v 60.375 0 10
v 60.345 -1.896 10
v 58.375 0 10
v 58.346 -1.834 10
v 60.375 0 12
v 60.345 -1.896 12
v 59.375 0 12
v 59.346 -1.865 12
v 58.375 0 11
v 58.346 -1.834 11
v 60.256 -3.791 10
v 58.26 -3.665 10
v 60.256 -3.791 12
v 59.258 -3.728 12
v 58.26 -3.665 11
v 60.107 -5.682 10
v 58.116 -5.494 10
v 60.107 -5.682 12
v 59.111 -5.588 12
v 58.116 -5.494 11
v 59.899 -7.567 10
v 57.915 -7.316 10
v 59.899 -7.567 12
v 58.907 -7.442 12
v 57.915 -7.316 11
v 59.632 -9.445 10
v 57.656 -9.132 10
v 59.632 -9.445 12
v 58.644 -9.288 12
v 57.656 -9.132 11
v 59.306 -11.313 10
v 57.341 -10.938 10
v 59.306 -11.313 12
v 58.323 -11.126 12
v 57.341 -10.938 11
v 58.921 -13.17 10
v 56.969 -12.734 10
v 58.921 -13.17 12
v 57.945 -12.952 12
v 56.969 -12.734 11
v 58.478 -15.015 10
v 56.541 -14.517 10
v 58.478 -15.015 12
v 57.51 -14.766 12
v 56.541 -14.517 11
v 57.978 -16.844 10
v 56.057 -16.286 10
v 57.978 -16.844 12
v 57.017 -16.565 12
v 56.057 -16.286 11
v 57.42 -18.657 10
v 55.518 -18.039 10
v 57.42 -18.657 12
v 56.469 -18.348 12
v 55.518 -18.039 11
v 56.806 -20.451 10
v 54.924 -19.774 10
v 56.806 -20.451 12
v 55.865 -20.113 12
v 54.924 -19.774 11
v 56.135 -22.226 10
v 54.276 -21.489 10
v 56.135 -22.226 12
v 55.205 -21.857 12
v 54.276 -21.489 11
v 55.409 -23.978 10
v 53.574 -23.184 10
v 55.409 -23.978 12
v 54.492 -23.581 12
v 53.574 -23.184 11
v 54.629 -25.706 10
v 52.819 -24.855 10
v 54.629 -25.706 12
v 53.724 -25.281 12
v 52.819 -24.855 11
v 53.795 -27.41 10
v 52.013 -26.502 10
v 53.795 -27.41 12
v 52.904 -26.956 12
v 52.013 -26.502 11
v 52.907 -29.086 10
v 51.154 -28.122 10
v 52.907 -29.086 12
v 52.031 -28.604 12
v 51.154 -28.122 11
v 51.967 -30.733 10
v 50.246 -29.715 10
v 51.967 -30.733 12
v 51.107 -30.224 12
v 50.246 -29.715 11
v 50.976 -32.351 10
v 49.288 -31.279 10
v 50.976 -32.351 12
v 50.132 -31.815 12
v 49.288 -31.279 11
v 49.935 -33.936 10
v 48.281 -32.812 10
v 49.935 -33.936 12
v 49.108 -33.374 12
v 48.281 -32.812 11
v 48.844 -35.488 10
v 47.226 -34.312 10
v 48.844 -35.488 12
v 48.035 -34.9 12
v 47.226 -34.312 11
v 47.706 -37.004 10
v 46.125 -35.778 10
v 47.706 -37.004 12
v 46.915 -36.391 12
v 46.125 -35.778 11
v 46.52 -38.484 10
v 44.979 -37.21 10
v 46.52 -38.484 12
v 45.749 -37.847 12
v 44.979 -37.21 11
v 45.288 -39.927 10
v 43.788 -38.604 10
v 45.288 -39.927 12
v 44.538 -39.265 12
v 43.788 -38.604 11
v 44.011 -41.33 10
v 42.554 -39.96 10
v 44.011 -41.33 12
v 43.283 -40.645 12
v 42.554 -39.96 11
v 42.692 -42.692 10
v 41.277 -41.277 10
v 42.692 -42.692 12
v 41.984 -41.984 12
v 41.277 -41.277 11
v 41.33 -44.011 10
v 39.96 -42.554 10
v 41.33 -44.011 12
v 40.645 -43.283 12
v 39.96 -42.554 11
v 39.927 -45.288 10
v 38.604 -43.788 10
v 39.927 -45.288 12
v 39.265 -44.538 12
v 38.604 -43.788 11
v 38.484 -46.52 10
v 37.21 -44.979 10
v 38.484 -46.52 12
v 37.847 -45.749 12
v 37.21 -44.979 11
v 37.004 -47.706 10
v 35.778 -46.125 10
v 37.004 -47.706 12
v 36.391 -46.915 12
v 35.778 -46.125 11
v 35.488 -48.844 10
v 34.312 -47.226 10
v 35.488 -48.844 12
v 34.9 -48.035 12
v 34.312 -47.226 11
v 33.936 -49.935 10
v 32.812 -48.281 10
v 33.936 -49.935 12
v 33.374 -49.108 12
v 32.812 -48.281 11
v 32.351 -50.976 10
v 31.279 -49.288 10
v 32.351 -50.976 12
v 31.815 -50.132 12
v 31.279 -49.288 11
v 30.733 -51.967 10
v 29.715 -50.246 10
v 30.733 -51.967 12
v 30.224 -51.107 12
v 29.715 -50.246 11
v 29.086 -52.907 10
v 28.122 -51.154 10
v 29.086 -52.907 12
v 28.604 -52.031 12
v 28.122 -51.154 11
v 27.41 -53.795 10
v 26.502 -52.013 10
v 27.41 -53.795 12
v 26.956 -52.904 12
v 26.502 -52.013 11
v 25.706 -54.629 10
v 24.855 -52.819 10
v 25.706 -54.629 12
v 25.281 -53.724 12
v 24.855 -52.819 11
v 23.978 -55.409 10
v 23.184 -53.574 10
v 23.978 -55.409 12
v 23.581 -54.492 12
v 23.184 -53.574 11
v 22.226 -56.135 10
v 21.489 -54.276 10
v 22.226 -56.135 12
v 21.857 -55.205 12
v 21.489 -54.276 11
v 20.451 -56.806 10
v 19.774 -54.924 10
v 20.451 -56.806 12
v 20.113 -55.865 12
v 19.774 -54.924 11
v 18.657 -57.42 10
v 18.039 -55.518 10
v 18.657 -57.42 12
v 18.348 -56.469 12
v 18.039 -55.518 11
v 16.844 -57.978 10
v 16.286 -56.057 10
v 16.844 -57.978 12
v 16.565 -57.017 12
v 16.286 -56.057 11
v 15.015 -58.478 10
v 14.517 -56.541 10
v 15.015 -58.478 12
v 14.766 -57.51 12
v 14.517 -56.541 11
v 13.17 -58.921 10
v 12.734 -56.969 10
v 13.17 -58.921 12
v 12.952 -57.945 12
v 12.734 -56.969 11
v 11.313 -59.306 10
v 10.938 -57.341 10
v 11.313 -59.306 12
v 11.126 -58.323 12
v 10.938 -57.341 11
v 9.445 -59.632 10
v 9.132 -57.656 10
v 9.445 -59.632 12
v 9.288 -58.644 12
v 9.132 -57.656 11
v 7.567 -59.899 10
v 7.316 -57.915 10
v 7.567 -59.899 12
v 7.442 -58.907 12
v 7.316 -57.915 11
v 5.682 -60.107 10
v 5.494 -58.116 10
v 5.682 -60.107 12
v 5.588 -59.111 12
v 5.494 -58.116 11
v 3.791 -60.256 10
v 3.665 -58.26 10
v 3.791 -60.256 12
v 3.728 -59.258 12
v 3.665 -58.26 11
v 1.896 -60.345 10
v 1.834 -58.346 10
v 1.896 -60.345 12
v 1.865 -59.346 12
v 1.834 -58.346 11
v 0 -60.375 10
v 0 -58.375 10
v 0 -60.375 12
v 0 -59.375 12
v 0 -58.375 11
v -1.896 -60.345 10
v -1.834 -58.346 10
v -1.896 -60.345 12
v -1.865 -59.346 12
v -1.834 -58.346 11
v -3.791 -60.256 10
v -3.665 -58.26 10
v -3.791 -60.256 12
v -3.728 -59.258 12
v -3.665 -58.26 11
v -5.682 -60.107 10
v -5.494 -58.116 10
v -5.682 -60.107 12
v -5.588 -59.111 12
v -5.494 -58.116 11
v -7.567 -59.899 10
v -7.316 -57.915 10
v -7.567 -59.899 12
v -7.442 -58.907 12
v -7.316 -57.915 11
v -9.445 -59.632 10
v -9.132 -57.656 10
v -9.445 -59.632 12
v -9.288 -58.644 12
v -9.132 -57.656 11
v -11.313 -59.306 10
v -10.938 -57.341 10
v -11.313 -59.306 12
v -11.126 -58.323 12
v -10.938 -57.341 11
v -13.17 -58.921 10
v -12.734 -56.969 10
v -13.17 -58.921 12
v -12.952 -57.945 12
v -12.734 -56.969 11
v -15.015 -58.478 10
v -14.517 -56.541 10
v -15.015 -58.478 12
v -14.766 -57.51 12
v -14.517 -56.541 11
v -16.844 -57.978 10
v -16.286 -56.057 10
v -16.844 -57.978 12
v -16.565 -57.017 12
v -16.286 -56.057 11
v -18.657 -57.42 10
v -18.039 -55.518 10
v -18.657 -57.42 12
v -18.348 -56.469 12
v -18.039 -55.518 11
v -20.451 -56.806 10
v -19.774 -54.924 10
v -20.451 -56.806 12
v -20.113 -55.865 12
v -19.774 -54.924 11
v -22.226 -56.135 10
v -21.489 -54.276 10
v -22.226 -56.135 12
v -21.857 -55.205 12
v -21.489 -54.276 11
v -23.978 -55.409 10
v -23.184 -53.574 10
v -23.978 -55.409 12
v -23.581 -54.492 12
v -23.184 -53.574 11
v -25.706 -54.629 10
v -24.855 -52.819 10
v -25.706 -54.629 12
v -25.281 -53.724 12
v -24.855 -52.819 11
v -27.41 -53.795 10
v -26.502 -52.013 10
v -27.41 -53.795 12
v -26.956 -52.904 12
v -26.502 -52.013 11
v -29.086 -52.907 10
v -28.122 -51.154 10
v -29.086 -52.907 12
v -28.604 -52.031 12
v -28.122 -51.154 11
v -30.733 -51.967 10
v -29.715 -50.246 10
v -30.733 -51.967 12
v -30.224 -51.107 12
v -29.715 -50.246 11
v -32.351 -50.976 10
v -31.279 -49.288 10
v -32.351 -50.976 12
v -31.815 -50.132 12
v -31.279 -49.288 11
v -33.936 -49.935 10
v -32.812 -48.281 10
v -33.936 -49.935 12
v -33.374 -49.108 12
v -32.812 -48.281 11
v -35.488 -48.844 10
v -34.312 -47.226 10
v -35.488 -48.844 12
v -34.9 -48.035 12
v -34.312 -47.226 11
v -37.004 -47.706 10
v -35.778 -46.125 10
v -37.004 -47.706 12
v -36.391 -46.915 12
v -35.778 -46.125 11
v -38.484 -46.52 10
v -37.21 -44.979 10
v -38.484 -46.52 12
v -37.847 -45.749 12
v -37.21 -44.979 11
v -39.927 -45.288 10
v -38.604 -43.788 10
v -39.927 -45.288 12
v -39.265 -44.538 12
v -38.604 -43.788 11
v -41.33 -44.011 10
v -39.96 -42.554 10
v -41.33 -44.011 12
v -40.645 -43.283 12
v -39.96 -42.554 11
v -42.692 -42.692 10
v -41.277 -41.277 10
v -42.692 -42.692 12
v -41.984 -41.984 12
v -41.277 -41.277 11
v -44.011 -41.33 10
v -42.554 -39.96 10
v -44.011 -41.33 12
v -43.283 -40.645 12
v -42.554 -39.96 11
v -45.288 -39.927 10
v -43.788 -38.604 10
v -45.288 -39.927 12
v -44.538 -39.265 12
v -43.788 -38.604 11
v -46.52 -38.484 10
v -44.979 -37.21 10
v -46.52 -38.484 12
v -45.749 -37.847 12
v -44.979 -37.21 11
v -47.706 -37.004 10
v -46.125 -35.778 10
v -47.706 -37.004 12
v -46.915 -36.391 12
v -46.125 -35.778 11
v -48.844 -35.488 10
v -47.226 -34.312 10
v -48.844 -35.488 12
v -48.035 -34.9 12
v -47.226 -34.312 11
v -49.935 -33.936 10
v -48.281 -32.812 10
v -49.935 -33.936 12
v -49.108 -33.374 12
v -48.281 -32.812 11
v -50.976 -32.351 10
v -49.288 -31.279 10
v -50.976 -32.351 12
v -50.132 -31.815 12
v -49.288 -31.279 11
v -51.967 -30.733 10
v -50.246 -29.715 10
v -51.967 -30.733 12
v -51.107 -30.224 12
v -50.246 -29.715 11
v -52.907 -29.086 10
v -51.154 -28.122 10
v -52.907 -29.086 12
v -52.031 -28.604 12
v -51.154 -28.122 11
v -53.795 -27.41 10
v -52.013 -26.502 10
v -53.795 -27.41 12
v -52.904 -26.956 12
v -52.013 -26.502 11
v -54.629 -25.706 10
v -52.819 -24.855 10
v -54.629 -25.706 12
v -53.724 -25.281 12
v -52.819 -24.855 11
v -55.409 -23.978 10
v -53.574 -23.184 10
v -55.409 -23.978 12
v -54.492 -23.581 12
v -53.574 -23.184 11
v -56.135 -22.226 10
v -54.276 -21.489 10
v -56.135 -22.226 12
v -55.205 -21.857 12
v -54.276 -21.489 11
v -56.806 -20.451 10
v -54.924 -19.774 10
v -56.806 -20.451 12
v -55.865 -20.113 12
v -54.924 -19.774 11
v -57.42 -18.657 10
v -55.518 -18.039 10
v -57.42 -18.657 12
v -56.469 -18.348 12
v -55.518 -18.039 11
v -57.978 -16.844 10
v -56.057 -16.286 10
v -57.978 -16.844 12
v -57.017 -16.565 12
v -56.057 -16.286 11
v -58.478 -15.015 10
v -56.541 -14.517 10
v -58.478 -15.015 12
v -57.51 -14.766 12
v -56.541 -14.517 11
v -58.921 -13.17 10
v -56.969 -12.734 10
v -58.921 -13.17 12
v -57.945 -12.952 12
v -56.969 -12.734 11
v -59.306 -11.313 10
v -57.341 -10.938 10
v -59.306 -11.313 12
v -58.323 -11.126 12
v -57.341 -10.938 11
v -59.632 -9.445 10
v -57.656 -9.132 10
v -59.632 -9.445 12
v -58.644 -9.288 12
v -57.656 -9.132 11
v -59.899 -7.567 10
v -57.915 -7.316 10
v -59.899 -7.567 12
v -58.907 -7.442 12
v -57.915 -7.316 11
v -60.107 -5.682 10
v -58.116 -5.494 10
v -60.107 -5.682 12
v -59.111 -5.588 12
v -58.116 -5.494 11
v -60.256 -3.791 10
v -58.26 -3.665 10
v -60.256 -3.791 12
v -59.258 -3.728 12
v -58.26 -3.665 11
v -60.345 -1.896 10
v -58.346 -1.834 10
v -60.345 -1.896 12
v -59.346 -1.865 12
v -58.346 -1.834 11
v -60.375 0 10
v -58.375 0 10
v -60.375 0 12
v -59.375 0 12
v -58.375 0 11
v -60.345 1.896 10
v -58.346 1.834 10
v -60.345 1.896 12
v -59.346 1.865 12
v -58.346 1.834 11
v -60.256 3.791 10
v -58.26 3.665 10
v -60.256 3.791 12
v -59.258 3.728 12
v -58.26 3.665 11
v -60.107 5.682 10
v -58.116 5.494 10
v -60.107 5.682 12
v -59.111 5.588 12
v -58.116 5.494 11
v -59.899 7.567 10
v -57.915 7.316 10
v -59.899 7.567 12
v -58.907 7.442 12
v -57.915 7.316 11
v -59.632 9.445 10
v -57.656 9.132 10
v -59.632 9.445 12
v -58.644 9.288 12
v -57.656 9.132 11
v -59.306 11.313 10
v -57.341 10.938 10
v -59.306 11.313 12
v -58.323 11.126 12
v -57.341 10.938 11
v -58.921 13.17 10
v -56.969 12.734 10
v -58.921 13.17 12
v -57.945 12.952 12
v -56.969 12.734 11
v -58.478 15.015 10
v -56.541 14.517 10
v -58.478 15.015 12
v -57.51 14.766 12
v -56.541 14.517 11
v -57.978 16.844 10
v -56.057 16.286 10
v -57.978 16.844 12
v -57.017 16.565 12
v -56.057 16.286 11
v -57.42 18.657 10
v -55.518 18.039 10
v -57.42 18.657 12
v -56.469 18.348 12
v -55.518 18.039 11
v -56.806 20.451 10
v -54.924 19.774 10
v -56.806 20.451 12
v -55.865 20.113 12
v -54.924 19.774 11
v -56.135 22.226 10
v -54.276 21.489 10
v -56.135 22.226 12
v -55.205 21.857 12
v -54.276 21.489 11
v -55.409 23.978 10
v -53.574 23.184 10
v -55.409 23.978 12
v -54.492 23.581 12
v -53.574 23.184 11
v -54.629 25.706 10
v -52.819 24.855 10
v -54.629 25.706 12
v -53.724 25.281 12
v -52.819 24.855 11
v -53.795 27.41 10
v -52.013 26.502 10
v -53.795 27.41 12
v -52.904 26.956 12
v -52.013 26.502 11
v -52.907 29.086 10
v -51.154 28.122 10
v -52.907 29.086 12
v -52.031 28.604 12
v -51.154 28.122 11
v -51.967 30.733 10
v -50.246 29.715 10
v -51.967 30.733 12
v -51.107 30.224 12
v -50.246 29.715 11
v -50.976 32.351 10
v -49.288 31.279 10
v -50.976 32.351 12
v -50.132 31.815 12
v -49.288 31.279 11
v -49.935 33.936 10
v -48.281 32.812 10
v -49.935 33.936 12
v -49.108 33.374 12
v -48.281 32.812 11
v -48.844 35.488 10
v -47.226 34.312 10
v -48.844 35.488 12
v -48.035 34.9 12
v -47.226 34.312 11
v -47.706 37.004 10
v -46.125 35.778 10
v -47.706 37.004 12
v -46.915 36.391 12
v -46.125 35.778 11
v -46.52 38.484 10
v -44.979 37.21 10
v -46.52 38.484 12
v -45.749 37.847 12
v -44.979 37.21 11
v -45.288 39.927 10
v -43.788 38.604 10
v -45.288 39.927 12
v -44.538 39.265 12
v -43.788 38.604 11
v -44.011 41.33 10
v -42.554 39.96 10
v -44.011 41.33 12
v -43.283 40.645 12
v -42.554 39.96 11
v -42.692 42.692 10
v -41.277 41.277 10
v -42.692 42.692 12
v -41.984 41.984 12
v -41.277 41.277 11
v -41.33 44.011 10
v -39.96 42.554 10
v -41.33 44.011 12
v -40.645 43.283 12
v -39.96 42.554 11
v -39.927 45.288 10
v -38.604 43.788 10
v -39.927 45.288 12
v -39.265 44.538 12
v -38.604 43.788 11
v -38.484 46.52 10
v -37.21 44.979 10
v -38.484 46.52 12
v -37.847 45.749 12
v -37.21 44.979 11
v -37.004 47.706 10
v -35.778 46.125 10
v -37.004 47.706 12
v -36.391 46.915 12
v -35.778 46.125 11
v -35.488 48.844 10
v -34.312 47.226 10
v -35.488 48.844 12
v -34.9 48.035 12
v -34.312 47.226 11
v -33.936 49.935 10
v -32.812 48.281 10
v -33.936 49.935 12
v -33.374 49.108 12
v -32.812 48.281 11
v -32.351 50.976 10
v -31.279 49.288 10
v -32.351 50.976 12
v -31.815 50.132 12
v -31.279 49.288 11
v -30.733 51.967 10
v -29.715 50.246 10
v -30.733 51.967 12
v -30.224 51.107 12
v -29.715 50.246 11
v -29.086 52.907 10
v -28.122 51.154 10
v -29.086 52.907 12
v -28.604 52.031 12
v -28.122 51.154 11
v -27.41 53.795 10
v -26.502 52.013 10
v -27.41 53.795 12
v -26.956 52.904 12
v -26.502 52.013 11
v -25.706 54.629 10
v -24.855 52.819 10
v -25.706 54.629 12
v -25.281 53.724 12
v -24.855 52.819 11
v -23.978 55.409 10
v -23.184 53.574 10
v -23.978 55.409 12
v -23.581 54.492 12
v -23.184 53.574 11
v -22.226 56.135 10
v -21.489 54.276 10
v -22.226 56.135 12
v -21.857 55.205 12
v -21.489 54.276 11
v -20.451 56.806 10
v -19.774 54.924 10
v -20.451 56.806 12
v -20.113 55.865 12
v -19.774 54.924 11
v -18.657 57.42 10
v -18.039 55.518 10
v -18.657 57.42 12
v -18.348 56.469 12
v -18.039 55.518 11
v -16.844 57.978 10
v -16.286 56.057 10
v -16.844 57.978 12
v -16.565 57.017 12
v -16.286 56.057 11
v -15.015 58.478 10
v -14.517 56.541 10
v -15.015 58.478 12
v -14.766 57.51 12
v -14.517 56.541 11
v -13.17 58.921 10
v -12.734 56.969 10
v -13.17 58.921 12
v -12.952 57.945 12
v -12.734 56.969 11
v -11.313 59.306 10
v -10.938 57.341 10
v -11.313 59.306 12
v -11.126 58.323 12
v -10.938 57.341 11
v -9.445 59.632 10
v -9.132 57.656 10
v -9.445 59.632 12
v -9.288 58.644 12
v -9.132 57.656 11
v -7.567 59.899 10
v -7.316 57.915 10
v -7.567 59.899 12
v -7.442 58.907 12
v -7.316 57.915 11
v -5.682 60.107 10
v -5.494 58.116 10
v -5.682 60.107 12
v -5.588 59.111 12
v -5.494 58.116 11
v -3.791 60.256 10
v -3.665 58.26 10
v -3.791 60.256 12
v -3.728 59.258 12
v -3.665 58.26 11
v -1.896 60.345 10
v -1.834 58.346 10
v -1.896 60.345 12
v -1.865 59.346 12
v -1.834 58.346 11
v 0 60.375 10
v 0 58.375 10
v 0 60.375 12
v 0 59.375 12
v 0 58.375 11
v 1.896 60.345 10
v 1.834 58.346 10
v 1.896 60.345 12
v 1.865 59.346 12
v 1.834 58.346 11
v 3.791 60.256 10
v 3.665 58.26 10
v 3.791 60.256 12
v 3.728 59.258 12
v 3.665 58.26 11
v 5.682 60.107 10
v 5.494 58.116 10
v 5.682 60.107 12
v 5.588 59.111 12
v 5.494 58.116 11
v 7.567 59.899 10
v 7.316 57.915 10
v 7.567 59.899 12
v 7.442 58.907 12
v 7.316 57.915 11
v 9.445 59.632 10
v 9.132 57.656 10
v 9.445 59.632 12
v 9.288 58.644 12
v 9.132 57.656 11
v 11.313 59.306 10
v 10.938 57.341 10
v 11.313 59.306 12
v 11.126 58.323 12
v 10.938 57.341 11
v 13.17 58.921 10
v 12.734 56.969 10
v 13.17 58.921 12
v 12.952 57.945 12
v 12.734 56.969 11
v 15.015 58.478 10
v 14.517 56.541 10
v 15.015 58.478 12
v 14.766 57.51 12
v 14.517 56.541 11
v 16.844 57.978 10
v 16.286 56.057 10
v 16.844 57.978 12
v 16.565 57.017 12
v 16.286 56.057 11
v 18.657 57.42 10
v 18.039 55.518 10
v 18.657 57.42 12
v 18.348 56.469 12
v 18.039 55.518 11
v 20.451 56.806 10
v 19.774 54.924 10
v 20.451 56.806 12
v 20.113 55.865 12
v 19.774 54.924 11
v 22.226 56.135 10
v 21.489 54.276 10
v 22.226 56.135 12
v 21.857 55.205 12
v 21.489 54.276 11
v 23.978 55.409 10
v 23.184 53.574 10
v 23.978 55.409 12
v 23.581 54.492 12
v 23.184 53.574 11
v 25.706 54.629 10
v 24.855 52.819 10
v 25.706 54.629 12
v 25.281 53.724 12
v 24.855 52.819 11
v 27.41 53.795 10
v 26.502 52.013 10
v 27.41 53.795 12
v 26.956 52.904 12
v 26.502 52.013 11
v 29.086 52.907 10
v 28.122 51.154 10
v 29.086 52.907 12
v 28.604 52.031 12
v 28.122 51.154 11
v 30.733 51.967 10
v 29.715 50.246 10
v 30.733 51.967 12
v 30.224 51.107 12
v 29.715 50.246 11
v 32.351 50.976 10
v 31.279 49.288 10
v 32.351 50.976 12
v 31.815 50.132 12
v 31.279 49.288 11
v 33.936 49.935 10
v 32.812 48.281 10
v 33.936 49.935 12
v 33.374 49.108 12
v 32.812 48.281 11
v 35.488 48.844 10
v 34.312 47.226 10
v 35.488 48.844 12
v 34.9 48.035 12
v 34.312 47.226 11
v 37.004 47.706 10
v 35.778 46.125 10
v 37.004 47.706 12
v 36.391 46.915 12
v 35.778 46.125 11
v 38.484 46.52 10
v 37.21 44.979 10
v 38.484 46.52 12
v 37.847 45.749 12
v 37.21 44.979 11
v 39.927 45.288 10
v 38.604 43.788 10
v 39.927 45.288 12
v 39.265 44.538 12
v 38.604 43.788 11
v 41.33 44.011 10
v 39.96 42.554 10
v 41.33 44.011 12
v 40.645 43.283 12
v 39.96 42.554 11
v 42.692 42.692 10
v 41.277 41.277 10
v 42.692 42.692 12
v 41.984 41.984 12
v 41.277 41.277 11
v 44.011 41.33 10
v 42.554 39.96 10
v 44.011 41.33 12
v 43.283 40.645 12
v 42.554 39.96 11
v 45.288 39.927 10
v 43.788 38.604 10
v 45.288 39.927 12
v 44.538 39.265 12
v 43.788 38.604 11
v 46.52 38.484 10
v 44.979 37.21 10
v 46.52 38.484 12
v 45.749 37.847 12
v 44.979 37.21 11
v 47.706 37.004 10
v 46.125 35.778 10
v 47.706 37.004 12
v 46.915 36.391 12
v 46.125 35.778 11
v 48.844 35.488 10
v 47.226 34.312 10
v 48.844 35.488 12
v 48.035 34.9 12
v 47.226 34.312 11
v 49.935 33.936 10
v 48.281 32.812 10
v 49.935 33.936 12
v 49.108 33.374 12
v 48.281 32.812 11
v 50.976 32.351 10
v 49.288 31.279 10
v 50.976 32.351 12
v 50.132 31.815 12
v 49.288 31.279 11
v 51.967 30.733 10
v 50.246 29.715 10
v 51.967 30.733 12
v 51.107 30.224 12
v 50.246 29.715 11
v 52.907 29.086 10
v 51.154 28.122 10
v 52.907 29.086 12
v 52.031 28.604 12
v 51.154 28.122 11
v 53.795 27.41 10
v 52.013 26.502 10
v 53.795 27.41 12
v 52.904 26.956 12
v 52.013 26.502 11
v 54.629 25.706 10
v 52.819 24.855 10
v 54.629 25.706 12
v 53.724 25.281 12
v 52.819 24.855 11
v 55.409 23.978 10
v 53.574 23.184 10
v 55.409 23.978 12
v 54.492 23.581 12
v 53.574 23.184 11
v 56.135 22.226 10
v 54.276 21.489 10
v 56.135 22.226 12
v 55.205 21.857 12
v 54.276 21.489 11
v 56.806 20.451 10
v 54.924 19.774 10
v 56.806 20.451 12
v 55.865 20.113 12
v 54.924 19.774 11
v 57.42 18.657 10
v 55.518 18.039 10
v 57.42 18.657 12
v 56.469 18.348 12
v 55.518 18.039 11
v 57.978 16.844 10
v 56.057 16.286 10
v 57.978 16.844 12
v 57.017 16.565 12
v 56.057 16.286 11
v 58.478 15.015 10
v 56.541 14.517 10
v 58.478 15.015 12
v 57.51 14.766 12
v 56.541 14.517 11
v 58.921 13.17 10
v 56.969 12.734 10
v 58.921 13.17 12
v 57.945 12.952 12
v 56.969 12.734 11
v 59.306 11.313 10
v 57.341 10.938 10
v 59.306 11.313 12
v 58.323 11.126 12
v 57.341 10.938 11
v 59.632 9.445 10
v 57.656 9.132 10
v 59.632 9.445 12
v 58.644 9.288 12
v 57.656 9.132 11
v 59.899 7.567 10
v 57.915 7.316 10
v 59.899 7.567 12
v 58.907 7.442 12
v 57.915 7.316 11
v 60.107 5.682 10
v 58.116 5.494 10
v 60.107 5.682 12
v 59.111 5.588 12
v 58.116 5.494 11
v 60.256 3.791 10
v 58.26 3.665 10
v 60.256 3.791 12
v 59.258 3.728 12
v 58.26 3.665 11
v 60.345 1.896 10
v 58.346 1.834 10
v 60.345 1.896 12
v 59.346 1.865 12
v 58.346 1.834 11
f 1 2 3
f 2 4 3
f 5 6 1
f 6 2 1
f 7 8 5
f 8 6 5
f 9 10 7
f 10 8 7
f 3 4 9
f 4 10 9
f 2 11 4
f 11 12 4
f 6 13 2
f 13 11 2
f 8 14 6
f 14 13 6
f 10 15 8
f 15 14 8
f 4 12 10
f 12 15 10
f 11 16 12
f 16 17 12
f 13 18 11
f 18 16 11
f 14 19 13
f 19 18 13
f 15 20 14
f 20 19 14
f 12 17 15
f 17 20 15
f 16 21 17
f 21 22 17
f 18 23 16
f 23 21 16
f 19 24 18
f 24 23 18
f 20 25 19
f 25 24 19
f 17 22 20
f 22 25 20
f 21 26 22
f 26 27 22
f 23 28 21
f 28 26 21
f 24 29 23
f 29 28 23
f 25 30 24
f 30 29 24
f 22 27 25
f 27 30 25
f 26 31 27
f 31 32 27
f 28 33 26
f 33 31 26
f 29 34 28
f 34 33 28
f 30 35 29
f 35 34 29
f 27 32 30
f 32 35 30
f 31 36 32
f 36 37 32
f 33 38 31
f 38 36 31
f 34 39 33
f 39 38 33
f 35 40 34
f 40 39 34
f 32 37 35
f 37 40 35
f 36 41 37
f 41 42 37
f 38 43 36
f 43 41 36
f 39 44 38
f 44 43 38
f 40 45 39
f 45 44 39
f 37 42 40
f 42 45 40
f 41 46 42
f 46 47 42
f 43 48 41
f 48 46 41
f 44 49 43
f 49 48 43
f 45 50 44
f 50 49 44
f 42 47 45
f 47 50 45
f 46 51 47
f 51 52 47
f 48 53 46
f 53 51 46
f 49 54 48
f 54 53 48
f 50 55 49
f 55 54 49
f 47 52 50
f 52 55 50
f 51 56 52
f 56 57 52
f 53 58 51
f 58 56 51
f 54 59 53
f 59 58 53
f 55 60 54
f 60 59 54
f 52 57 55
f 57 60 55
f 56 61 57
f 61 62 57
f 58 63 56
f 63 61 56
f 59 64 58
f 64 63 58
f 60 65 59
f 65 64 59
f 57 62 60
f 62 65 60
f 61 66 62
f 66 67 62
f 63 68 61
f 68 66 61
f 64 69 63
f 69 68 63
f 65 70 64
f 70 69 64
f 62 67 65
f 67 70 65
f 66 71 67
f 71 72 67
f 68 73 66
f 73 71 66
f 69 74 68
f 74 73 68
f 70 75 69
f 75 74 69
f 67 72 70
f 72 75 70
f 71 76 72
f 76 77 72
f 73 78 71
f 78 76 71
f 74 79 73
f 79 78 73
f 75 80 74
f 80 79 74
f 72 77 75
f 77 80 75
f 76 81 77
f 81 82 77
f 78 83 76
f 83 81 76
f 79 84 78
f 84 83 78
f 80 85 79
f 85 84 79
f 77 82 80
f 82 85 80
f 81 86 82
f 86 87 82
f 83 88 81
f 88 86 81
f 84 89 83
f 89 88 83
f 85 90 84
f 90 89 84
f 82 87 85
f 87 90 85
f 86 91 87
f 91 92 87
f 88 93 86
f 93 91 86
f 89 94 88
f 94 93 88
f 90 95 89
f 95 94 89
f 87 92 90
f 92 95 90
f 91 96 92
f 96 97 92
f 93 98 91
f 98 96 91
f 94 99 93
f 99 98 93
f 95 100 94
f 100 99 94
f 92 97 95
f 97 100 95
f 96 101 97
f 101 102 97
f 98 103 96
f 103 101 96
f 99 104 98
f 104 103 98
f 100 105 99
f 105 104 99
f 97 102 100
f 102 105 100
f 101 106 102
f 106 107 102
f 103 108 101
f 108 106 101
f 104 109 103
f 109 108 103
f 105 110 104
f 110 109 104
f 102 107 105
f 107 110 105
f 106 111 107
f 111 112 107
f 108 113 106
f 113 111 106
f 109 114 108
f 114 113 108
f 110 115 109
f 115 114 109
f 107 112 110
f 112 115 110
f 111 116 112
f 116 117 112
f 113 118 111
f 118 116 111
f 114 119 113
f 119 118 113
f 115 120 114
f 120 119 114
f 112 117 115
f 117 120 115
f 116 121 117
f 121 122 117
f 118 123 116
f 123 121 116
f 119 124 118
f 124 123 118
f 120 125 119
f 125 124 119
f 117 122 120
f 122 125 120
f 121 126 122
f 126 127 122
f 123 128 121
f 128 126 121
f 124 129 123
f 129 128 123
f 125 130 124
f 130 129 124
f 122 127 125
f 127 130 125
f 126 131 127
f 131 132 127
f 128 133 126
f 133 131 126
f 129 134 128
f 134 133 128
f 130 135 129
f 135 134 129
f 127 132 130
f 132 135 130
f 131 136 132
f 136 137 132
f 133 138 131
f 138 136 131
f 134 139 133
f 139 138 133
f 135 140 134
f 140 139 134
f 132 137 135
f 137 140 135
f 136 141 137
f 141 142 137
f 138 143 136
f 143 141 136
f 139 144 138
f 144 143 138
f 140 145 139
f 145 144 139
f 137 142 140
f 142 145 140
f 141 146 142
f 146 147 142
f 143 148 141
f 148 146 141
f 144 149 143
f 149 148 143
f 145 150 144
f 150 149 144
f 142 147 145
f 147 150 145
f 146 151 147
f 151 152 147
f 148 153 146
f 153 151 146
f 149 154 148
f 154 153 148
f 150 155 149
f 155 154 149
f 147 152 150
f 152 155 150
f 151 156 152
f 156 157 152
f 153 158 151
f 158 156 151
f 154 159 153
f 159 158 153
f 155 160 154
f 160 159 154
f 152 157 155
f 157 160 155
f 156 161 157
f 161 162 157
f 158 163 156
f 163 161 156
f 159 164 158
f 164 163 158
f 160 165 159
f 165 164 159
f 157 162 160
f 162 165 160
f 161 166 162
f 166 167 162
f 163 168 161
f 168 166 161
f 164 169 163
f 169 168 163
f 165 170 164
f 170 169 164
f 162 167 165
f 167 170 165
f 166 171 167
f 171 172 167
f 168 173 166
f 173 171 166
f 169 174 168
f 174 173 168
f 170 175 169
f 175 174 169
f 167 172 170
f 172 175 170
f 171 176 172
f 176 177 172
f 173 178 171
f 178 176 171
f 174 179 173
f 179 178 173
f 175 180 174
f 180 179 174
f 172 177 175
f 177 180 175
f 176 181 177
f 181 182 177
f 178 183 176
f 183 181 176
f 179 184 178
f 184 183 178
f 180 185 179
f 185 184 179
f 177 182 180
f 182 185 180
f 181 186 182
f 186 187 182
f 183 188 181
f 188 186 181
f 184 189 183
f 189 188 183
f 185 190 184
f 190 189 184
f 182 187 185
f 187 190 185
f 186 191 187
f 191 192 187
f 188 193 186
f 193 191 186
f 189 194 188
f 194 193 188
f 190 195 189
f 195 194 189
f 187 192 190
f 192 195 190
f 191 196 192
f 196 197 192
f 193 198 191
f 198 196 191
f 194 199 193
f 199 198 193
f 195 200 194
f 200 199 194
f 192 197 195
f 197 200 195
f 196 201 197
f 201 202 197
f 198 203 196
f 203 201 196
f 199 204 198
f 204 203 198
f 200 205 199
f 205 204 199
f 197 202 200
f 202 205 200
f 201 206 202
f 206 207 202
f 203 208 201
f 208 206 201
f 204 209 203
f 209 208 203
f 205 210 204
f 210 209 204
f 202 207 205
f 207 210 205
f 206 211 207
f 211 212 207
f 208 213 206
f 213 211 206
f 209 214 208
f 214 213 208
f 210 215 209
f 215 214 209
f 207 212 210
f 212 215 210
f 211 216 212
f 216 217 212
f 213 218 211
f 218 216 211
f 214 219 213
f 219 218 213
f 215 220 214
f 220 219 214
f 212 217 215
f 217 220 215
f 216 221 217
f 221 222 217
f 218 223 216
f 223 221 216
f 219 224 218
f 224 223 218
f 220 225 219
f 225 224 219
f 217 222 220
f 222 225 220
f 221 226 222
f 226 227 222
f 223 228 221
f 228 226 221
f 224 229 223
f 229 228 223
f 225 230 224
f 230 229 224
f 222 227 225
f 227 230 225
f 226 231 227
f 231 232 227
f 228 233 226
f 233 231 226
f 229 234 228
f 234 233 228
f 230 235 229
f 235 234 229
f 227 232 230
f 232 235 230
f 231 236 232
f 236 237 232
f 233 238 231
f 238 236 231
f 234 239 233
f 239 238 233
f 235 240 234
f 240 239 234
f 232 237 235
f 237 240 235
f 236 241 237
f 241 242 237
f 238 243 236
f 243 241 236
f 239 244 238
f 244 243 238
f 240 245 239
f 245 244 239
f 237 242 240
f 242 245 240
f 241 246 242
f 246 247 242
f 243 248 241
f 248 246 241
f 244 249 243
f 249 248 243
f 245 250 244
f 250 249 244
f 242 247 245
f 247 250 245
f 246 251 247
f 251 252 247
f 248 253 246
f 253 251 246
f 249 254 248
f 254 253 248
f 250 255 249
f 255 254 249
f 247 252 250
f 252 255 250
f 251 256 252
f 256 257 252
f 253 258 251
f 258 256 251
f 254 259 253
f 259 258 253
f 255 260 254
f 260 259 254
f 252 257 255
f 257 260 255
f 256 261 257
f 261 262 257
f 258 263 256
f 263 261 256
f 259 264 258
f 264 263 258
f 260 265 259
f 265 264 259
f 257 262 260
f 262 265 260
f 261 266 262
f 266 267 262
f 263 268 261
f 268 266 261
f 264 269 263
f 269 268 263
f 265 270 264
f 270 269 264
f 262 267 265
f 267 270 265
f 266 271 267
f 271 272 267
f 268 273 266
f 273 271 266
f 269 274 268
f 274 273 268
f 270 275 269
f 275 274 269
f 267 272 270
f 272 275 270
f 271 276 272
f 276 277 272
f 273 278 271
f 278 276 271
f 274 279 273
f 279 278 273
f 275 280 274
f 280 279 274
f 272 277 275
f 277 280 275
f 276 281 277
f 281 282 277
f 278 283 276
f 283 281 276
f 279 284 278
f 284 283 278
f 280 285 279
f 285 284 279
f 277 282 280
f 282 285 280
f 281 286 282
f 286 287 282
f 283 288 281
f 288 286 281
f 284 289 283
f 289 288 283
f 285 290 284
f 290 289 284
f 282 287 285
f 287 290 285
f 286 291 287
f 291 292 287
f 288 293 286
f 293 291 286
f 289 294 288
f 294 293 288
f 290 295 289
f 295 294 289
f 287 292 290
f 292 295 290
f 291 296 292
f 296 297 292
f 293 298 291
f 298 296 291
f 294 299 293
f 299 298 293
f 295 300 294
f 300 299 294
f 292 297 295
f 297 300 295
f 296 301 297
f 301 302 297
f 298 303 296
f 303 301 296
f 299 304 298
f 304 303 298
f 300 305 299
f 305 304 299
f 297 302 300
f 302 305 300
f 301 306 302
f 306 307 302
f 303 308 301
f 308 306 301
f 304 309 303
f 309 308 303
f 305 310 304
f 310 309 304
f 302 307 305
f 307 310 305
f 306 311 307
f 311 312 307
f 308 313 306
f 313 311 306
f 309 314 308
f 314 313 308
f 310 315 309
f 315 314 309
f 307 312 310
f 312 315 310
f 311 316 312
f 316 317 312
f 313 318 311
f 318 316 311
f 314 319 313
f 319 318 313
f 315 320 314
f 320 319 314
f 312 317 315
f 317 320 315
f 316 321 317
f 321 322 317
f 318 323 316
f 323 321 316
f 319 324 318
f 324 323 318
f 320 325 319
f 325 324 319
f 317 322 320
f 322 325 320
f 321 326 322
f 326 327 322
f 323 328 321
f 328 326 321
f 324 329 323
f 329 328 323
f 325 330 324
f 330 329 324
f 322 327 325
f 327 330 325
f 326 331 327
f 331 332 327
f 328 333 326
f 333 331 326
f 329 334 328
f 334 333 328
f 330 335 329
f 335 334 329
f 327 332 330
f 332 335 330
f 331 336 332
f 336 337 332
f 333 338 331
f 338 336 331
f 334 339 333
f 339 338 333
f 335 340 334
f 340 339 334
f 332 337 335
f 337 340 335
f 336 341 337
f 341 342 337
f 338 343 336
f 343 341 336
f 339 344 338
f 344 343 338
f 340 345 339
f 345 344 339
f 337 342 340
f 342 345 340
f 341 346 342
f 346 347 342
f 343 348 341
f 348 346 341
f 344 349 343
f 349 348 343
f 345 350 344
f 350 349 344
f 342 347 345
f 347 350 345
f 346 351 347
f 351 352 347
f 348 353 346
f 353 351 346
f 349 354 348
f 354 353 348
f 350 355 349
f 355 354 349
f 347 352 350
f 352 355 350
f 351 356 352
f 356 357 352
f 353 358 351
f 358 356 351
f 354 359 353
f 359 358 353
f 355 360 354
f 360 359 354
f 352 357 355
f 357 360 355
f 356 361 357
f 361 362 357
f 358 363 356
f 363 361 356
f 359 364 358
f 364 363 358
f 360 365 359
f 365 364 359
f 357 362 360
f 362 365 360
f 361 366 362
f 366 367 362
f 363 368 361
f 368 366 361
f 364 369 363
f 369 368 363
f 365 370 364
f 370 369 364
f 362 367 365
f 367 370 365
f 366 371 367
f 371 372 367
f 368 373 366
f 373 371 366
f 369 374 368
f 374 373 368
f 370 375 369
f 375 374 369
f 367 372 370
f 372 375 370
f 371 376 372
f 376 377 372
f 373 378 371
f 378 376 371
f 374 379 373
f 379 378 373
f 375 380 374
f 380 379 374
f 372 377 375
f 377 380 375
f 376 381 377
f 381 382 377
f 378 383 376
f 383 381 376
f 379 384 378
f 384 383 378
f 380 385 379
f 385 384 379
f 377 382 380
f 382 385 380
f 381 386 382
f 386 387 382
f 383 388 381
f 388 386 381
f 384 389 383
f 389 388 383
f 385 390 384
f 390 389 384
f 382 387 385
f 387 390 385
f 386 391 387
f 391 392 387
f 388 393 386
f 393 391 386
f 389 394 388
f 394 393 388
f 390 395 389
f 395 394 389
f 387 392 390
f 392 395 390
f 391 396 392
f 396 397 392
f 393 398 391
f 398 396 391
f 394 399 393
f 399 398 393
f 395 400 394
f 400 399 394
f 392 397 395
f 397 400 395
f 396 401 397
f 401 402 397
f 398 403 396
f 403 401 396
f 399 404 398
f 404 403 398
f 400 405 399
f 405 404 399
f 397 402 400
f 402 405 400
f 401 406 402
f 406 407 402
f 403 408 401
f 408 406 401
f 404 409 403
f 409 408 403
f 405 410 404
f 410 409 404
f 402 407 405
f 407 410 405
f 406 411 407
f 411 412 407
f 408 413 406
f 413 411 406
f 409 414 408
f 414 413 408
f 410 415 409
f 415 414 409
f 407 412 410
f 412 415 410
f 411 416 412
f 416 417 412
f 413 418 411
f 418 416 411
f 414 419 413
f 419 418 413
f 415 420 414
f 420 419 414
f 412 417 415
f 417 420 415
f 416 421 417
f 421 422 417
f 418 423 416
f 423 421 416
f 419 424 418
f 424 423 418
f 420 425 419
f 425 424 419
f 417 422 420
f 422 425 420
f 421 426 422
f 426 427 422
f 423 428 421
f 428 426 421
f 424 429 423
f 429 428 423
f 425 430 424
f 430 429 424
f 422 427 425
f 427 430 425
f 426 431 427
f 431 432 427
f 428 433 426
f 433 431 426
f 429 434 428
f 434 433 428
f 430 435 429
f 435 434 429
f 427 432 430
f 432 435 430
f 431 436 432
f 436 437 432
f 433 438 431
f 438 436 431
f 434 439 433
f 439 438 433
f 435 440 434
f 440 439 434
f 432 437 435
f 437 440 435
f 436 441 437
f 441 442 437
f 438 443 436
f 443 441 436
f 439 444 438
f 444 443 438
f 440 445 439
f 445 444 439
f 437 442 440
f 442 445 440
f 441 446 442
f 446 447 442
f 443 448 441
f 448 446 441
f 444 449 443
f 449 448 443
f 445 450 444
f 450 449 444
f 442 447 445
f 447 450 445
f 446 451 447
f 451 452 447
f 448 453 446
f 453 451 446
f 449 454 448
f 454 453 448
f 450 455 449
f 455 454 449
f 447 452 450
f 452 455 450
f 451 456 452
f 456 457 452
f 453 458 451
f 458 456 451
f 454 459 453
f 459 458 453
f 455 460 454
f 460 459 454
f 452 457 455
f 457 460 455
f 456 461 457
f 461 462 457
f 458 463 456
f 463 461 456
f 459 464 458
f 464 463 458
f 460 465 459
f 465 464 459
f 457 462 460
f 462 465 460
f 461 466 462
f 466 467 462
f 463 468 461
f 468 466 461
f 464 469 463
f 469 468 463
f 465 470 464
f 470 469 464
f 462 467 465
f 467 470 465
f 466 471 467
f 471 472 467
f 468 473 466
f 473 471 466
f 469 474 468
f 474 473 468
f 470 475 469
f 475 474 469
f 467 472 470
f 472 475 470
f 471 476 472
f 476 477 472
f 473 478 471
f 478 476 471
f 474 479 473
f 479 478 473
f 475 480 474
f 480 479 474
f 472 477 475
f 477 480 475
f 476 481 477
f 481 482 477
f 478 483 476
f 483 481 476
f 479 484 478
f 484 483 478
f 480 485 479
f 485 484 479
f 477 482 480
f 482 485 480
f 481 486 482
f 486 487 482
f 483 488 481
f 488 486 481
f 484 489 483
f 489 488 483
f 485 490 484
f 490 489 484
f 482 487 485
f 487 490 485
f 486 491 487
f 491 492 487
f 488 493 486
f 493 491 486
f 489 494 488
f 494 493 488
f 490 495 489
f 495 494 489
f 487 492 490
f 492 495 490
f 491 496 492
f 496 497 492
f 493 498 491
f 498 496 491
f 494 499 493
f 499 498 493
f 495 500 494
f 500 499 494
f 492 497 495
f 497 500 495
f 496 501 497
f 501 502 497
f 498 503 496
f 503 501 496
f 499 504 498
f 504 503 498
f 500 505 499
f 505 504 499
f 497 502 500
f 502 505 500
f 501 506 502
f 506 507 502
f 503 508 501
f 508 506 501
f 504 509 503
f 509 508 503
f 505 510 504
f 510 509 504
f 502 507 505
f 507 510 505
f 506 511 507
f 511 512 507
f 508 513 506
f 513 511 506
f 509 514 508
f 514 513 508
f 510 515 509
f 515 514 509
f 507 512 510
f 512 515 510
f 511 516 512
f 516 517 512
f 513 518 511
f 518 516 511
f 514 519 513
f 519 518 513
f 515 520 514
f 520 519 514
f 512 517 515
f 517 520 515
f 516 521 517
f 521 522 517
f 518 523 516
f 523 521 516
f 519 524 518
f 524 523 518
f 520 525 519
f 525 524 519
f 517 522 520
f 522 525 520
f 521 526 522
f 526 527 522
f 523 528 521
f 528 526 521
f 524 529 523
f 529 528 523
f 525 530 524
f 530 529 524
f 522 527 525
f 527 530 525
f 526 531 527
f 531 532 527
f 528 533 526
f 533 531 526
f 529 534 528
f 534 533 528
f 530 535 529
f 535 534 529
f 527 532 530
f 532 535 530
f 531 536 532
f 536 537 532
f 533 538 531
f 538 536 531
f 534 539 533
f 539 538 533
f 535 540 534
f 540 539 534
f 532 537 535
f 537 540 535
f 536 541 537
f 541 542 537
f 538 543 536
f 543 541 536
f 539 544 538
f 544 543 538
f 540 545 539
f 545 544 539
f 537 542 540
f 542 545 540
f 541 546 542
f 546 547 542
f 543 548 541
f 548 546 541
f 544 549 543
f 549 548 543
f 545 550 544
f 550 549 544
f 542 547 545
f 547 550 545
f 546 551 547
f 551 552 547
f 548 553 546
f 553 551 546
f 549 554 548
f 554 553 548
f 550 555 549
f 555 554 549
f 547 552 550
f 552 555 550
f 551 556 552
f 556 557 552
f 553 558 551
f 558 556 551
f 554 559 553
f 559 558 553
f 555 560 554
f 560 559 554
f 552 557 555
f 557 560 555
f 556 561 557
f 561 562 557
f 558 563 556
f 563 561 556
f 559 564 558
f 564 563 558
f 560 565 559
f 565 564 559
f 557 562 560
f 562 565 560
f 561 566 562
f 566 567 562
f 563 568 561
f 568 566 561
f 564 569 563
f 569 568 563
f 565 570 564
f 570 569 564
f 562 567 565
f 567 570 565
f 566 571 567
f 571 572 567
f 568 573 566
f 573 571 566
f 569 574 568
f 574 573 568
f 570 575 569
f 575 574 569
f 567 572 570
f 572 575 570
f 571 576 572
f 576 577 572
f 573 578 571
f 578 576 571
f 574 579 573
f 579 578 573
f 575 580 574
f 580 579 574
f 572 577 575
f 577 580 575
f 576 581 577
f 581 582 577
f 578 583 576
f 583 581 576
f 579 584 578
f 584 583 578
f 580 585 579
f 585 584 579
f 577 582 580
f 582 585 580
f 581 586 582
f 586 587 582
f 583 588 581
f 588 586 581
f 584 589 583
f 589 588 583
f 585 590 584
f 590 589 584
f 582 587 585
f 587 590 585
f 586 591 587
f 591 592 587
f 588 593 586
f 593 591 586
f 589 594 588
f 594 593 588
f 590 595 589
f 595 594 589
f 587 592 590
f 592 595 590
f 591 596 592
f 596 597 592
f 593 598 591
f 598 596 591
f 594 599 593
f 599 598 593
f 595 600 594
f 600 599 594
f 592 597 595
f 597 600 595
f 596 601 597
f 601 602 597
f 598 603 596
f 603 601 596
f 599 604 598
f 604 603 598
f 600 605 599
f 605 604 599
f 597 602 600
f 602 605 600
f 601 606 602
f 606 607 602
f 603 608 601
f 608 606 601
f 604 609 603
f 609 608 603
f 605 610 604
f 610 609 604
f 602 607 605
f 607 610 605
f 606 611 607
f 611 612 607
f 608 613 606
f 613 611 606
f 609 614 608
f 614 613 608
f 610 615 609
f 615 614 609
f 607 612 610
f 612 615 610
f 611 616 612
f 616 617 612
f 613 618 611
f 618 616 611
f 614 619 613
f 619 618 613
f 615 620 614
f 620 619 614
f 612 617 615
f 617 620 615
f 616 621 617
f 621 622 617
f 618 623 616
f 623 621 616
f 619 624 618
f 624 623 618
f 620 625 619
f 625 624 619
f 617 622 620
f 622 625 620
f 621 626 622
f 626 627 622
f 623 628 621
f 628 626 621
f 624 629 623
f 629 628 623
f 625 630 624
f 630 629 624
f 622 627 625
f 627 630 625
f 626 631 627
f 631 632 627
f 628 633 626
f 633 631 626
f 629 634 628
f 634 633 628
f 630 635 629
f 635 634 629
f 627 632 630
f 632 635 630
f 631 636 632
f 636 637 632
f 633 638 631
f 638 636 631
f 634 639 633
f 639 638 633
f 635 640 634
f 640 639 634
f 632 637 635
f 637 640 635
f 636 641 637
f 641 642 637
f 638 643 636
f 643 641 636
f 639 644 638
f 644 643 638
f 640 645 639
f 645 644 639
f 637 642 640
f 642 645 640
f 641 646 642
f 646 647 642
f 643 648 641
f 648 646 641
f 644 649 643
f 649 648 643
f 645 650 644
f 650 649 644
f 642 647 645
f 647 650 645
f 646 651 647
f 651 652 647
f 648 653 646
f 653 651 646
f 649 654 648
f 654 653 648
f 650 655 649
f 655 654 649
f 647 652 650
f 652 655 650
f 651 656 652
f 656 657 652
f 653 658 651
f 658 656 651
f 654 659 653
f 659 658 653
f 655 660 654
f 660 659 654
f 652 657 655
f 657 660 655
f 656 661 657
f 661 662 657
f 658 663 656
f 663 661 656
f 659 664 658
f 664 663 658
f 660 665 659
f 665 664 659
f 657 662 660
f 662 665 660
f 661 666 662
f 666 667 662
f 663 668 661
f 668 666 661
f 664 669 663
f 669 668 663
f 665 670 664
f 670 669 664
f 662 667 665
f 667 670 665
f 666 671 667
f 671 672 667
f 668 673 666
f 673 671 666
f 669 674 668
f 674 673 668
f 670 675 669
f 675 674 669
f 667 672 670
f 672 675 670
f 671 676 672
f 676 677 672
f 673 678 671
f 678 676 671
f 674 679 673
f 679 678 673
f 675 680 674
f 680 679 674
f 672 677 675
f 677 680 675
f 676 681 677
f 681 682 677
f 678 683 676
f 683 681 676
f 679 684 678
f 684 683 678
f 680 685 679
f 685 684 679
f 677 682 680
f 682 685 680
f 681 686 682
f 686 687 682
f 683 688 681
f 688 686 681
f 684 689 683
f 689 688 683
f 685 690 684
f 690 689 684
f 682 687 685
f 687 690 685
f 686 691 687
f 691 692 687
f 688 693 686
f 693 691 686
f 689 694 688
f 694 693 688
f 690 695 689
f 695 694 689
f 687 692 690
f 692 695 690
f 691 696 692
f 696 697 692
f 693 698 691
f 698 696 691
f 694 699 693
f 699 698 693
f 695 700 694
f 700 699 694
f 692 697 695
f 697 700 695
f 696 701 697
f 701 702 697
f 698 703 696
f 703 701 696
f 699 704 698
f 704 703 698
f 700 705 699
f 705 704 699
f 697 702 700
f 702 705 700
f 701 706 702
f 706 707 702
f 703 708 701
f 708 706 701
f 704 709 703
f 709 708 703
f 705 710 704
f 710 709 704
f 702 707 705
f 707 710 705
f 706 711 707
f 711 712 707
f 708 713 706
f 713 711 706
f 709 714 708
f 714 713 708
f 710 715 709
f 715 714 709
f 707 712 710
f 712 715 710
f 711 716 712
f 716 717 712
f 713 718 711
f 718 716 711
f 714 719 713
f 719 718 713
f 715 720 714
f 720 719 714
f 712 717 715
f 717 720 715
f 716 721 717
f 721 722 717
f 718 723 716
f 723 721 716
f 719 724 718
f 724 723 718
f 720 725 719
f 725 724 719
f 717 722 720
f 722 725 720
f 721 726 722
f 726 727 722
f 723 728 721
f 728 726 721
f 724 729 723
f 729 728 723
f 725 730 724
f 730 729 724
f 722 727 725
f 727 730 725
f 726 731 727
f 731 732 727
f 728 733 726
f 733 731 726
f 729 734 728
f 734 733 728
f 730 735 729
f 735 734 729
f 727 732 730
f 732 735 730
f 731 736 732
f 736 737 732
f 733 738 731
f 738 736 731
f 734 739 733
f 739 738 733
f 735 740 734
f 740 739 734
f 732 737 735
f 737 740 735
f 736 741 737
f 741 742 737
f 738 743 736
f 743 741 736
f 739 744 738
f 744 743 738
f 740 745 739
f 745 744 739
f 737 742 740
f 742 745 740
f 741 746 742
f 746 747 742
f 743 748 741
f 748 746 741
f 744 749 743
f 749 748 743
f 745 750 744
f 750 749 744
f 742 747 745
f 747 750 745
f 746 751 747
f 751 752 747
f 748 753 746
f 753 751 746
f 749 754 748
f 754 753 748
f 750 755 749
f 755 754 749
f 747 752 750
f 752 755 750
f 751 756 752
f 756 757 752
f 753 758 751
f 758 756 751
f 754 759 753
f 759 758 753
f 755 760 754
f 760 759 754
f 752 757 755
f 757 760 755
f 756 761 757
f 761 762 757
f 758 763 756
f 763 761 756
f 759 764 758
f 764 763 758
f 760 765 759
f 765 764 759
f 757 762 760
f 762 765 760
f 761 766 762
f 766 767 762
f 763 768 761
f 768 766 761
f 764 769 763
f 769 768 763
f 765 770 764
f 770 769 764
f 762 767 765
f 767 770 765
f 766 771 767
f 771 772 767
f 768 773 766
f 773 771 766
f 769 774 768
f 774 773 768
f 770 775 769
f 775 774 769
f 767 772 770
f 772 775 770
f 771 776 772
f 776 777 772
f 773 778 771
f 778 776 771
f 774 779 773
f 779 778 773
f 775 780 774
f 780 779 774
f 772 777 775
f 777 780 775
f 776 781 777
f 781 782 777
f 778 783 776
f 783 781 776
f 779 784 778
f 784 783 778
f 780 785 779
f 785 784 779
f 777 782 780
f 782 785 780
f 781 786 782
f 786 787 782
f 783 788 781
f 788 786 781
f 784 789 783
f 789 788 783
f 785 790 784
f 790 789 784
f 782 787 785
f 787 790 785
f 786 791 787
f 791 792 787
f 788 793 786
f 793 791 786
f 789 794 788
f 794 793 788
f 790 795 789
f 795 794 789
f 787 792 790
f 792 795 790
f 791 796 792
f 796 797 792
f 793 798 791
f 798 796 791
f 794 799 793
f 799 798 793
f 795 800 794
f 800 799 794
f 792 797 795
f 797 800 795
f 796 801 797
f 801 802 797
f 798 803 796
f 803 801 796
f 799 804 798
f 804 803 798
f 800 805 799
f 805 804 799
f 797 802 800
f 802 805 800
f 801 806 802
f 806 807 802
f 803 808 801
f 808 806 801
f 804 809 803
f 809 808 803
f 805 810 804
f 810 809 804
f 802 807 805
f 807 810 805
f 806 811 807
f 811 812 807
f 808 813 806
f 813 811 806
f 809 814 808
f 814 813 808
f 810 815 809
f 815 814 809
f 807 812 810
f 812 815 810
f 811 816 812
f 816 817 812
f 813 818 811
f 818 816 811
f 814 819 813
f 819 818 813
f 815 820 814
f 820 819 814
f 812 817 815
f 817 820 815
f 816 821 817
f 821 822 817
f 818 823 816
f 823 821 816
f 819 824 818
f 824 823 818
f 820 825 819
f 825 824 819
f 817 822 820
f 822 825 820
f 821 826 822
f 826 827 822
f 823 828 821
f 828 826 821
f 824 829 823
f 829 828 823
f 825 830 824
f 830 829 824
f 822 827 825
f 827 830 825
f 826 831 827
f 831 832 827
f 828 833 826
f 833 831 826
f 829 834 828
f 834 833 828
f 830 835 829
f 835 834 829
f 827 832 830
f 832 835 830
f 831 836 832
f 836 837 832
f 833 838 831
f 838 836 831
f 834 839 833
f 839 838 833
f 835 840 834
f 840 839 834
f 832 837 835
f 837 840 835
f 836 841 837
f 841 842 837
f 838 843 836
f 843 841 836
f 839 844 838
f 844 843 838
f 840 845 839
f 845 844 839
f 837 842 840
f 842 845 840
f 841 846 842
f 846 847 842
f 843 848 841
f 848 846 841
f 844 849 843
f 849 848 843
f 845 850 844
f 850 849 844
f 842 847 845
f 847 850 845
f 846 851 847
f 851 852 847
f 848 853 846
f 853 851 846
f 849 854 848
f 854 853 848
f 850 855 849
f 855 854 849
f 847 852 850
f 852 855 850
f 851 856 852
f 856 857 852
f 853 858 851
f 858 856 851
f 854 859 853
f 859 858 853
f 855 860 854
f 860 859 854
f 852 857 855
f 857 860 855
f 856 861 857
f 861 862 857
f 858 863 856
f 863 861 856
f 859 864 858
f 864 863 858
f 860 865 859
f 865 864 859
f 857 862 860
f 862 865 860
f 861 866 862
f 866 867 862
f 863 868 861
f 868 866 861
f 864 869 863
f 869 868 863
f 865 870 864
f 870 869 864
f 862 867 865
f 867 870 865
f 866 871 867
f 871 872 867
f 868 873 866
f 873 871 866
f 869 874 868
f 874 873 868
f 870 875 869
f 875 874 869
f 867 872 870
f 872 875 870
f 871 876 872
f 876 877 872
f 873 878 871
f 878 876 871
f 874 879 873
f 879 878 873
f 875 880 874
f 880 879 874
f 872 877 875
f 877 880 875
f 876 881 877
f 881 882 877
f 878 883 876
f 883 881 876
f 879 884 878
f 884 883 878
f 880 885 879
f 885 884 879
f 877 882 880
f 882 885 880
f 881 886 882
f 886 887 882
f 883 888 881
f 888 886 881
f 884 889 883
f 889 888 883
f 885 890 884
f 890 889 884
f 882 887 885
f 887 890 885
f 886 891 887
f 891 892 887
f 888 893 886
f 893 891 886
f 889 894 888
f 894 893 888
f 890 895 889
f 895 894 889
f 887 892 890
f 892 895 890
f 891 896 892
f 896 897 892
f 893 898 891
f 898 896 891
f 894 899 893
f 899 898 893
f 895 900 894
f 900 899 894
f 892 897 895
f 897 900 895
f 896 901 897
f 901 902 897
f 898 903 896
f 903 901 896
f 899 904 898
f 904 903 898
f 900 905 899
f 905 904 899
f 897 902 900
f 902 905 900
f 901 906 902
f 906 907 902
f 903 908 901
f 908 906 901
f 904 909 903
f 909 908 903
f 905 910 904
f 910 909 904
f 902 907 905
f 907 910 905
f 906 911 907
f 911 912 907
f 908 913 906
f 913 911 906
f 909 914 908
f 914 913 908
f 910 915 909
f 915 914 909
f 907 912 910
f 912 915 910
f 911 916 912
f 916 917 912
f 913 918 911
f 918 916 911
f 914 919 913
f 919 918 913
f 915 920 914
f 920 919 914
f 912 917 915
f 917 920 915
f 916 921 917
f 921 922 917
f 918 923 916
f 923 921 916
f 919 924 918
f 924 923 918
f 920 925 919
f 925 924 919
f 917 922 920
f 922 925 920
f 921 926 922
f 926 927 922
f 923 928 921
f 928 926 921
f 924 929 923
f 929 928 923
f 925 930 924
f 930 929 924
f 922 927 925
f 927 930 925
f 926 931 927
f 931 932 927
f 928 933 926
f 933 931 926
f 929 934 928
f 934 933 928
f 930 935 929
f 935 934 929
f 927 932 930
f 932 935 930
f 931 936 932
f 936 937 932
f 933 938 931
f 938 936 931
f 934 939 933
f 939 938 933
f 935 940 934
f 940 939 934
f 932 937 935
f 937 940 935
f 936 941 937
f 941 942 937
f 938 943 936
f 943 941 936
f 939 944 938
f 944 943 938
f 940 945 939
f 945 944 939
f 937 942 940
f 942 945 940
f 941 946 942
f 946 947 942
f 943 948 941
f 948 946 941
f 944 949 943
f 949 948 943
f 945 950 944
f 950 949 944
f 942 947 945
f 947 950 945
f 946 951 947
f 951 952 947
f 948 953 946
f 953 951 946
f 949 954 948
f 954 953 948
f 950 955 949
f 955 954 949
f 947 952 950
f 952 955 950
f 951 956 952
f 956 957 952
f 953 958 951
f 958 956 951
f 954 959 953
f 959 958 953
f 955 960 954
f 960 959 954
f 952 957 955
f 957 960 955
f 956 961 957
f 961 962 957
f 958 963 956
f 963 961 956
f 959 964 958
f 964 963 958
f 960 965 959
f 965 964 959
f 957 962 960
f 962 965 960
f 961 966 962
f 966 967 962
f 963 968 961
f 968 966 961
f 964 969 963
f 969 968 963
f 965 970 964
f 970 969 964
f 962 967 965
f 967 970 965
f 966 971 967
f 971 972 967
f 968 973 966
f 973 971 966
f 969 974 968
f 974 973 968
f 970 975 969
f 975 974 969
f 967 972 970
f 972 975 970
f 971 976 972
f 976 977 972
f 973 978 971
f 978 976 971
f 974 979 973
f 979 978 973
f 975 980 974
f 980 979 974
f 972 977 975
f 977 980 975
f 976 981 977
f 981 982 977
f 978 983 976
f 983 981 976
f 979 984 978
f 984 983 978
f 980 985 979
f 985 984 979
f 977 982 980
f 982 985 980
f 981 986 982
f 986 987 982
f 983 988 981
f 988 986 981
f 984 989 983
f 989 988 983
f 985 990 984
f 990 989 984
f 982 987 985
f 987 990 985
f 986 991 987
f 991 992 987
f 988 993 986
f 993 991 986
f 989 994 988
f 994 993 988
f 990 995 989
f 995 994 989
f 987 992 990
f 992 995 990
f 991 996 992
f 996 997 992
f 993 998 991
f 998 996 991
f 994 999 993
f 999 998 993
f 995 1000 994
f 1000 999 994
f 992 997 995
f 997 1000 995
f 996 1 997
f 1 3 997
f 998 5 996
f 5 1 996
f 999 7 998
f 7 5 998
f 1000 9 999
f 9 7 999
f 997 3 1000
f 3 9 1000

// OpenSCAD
$fn = 200;


innerDiameter = 119;

edgeDepth = 5;

diameter = innerDiameter + 2 * edgeDepth;

baseHieght = 3;

lipHieght = 4;

slotWidth = 10;
slotDepth = edgeDepth;
slotOffset = (diameter /2)- slotDepth;

//cylinder(baseHieght, d = diameter, center = true);

    ringOverallHeight = 9;
    ringInteriorHeight = ringOverallHeight - 2;
module verticalRing() {
    


//    rotate_extrude(angle = 360, convexity = 2)
    translate([-diameter/2, 0,0])
    polygon (
    [
    [0,0],
    [0,10],
    [2,baseHieght + ringOverallHeight],
    [4,baseHieght + ringOverallHeight],
    [4,baseHieght + ringInteriorHeight],
    [5,10],
    [5,0]
    ]
    );
    
}


 //verticalRing();
simpleRing();
// mirror([0,0,1]) capRing();

module simpleRing() {
    rotate_extrude(angle = 360, convexity = 2)
translate([-diameter/2 + 0.125 + 4, baseHieght + ringInteriorHeight,0])
polygon([
    [0,0],
    [0,2],
    [1,2],
    [2,1],
    [2,0]
    ]);

}

module capRing () {
    rotate_extrude(angle = 360, convexity = 2)
translate([-diameter/2 + 0.25 + 4, 0,0])
polygon(
[
[0,0.25],
[1,0.25],
[1,2],
[3,2],
[2,4],
[-0.25, 4],
[-2.25, 2],
[0,2]
]
);
}
